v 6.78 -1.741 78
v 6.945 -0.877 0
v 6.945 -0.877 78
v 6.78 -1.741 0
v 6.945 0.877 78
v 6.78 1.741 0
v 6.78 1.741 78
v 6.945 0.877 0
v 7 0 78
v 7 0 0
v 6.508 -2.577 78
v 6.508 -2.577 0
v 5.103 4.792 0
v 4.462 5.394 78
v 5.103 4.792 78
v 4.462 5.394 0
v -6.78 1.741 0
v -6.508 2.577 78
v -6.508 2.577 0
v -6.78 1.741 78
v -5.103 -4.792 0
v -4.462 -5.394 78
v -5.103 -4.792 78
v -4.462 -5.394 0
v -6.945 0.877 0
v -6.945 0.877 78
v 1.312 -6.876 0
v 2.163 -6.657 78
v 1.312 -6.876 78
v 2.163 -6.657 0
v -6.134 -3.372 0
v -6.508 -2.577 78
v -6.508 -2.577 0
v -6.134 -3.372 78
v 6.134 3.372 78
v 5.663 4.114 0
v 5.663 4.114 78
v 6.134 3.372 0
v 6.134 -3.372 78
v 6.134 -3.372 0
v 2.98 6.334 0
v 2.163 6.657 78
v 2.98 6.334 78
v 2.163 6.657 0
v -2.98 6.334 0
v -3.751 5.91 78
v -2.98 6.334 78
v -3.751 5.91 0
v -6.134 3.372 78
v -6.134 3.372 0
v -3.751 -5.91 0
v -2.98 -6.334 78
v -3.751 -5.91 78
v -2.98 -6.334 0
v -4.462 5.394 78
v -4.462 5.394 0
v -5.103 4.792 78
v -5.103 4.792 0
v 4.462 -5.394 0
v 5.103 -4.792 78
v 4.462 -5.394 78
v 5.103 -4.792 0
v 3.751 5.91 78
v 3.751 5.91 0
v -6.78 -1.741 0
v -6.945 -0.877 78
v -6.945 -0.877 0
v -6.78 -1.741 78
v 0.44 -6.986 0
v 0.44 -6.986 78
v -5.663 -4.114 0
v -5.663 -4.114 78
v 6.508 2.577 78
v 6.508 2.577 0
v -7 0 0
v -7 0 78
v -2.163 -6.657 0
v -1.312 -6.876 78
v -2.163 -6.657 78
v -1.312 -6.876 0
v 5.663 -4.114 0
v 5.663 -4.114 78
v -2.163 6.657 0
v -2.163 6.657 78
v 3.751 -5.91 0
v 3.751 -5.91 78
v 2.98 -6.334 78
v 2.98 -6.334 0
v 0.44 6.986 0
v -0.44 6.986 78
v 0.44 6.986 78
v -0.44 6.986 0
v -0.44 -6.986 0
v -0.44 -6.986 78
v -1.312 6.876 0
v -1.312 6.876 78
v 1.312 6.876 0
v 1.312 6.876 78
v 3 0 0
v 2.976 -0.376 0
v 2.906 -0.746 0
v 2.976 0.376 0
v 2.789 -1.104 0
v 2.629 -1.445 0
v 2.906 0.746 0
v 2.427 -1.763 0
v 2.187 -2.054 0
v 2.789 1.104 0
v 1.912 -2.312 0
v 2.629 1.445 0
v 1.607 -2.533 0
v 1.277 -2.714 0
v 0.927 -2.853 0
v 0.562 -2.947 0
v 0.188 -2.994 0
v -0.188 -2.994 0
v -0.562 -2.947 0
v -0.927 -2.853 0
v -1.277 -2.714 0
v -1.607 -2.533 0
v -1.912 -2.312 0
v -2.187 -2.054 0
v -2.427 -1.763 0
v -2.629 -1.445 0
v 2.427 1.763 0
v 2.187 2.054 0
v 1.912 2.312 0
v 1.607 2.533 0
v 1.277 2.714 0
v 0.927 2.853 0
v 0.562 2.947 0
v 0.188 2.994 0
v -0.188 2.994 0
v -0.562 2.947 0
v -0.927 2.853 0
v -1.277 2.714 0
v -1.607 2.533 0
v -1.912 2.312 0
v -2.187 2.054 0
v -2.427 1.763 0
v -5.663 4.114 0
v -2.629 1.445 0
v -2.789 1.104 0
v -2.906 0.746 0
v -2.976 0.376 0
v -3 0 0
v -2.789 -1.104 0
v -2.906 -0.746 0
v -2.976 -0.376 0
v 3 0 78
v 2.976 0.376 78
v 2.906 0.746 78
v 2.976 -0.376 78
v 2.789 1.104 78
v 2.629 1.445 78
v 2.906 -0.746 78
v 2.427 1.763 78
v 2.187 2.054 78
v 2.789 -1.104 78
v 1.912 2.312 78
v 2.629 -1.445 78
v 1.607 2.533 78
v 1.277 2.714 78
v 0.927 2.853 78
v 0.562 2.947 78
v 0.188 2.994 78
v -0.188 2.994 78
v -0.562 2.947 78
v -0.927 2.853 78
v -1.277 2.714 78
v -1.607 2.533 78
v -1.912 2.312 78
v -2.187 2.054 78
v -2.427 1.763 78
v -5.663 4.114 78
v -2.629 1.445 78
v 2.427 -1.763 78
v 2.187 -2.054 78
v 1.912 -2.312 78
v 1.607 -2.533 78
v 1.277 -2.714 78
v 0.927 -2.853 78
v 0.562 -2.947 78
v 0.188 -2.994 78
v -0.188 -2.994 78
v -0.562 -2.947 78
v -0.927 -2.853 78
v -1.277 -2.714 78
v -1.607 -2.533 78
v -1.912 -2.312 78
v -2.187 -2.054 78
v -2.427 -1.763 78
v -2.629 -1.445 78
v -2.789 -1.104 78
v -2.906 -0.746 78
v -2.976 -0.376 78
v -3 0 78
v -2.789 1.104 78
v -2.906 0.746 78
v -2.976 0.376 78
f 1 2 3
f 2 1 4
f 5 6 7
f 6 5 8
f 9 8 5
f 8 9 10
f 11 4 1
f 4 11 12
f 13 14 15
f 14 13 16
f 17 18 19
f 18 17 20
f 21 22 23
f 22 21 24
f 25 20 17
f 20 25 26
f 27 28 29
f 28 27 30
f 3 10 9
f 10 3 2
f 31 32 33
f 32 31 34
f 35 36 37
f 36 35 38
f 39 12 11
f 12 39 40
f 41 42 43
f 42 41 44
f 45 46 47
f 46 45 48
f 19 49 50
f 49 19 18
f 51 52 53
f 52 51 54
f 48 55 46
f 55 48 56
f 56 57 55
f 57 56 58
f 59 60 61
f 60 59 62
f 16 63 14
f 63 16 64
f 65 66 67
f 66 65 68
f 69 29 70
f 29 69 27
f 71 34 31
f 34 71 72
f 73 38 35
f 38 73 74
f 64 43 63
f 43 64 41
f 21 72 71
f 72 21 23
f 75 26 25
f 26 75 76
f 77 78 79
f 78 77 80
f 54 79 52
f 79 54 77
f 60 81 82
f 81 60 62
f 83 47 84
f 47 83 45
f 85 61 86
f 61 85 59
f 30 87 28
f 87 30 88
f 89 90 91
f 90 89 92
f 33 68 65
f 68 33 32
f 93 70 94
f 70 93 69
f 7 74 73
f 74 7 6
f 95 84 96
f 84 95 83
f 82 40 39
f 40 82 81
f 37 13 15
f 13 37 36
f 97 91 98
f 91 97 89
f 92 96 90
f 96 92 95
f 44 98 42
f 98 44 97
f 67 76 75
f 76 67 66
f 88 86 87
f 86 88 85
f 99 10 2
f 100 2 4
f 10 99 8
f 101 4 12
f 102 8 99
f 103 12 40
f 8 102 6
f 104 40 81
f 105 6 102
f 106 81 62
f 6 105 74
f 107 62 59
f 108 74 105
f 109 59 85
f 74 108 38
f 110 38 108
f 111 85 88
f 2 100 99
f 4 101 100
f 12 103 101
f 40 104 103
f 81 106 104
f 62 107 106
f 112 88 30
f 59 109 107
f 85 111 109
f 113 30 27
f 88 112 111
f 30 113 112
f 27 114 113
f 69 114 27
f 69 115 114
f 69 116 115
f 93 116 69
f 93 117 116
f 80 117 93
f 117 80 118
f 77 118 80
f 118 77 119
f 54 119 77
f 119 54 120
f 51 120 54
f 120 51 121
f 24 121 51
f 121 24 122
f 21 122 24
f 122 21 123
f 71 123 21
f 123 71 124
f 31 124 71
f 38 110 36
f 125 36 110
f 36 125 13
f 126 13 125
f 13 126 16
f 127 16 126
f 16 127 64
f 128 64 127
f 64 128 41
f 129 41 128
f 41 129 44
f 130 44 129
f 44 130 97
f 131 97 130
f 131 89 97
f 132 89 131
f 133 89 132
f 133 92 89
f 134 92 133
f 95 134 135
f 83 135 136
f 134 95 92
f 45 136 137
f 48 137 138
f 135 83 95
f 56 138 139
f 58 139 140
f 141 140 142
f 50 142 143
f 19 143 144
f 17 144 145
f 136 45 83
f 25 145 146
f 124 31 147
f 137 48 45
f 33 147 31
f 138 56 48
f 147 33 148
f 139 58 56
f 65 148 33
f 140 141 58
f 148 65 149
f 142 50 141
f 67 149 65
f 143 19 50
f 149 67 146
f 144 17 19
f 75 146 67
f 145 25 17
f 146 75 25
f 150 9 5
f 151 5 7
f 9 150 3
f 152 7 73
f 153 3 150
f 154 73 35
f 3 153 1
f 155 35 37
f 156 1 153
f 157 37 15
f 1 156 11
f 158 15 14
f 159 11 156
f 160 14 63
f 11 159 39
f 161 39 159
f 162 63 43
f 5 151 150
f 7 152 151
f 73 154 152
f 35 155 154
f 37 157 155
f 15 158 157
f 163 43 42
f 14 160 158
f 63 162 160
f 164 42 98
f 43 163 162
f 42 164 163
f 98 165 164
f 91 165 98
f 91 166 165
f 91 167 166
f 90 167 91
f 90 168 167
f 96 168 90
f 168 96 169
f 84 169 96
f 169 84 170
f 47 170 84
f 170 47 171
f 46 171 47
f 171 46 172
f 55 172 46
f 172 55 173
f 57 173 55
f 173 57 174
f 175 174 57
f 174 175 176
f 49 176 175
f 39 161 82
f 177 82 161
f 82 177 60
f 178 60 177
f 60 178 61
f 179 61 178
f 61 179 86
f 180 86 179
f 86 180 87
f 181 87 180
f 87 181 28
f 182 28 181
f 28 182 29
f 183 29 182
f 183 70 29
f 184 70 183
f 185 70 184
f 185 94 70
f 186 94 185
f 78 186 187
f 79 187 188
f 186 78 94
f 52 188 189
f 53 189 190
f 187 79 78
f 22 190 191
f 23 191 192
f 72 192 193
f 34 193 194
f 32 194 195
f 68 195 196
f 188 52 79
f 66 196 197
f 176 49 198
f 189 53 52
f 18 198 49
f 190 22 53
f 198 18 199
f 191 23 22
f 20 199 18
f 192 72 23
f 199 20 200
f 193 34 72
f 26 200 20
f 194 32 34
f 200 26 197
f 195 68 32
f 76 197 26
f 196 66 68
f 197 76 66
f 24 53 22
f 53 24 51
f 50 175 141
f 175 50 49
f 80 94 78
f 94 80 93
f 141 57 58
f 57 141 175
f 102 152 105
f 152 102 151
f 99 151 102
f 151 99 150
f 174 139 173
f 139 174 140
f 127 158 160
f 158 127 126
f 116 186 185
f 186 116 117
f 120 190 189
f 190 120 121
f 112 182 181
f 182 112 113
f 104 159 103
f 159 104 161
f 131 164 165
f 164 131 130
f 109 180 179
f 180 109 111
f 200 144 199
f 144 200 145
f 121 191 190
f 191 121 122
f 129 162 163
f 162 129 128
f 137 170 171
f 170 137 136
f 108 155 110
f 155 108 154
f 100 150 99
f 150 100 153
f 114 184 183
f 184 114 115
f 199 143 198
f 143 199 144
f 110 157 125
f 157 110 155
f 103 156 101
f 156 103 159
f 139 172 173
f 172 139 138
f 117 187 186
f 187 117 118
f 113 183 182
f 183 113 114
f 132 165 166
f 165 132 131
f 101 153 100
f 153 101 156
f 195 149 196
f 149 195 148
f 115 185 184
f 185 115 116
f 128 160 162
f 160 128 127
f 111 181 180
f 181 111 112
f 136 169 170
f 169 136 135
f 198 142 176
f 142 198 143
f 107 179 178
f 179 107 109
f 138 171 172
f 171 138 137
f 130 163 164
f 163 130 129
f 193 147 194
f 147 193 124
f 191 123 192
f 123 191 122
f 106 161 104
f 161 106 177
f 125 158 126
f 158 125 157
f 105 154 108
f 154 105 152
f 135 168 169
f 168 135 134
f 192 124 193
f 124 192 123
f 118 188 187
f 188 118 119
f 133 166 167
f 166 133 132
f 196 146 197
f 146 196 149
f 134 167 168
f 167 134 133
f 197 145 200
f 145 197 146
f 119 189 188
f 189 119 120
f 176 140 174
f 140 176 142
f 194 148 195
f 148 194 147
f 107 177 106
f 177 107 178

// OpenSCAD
$fn = 50;


difference() {
	union() {
		cylinder(h = 78, r = 7.0000000000);
	}
	union() {
		translate(v = [0, 0, -100]) {
			cylinder(h = 200, r = 3.0000000000);
		}
	}
}
